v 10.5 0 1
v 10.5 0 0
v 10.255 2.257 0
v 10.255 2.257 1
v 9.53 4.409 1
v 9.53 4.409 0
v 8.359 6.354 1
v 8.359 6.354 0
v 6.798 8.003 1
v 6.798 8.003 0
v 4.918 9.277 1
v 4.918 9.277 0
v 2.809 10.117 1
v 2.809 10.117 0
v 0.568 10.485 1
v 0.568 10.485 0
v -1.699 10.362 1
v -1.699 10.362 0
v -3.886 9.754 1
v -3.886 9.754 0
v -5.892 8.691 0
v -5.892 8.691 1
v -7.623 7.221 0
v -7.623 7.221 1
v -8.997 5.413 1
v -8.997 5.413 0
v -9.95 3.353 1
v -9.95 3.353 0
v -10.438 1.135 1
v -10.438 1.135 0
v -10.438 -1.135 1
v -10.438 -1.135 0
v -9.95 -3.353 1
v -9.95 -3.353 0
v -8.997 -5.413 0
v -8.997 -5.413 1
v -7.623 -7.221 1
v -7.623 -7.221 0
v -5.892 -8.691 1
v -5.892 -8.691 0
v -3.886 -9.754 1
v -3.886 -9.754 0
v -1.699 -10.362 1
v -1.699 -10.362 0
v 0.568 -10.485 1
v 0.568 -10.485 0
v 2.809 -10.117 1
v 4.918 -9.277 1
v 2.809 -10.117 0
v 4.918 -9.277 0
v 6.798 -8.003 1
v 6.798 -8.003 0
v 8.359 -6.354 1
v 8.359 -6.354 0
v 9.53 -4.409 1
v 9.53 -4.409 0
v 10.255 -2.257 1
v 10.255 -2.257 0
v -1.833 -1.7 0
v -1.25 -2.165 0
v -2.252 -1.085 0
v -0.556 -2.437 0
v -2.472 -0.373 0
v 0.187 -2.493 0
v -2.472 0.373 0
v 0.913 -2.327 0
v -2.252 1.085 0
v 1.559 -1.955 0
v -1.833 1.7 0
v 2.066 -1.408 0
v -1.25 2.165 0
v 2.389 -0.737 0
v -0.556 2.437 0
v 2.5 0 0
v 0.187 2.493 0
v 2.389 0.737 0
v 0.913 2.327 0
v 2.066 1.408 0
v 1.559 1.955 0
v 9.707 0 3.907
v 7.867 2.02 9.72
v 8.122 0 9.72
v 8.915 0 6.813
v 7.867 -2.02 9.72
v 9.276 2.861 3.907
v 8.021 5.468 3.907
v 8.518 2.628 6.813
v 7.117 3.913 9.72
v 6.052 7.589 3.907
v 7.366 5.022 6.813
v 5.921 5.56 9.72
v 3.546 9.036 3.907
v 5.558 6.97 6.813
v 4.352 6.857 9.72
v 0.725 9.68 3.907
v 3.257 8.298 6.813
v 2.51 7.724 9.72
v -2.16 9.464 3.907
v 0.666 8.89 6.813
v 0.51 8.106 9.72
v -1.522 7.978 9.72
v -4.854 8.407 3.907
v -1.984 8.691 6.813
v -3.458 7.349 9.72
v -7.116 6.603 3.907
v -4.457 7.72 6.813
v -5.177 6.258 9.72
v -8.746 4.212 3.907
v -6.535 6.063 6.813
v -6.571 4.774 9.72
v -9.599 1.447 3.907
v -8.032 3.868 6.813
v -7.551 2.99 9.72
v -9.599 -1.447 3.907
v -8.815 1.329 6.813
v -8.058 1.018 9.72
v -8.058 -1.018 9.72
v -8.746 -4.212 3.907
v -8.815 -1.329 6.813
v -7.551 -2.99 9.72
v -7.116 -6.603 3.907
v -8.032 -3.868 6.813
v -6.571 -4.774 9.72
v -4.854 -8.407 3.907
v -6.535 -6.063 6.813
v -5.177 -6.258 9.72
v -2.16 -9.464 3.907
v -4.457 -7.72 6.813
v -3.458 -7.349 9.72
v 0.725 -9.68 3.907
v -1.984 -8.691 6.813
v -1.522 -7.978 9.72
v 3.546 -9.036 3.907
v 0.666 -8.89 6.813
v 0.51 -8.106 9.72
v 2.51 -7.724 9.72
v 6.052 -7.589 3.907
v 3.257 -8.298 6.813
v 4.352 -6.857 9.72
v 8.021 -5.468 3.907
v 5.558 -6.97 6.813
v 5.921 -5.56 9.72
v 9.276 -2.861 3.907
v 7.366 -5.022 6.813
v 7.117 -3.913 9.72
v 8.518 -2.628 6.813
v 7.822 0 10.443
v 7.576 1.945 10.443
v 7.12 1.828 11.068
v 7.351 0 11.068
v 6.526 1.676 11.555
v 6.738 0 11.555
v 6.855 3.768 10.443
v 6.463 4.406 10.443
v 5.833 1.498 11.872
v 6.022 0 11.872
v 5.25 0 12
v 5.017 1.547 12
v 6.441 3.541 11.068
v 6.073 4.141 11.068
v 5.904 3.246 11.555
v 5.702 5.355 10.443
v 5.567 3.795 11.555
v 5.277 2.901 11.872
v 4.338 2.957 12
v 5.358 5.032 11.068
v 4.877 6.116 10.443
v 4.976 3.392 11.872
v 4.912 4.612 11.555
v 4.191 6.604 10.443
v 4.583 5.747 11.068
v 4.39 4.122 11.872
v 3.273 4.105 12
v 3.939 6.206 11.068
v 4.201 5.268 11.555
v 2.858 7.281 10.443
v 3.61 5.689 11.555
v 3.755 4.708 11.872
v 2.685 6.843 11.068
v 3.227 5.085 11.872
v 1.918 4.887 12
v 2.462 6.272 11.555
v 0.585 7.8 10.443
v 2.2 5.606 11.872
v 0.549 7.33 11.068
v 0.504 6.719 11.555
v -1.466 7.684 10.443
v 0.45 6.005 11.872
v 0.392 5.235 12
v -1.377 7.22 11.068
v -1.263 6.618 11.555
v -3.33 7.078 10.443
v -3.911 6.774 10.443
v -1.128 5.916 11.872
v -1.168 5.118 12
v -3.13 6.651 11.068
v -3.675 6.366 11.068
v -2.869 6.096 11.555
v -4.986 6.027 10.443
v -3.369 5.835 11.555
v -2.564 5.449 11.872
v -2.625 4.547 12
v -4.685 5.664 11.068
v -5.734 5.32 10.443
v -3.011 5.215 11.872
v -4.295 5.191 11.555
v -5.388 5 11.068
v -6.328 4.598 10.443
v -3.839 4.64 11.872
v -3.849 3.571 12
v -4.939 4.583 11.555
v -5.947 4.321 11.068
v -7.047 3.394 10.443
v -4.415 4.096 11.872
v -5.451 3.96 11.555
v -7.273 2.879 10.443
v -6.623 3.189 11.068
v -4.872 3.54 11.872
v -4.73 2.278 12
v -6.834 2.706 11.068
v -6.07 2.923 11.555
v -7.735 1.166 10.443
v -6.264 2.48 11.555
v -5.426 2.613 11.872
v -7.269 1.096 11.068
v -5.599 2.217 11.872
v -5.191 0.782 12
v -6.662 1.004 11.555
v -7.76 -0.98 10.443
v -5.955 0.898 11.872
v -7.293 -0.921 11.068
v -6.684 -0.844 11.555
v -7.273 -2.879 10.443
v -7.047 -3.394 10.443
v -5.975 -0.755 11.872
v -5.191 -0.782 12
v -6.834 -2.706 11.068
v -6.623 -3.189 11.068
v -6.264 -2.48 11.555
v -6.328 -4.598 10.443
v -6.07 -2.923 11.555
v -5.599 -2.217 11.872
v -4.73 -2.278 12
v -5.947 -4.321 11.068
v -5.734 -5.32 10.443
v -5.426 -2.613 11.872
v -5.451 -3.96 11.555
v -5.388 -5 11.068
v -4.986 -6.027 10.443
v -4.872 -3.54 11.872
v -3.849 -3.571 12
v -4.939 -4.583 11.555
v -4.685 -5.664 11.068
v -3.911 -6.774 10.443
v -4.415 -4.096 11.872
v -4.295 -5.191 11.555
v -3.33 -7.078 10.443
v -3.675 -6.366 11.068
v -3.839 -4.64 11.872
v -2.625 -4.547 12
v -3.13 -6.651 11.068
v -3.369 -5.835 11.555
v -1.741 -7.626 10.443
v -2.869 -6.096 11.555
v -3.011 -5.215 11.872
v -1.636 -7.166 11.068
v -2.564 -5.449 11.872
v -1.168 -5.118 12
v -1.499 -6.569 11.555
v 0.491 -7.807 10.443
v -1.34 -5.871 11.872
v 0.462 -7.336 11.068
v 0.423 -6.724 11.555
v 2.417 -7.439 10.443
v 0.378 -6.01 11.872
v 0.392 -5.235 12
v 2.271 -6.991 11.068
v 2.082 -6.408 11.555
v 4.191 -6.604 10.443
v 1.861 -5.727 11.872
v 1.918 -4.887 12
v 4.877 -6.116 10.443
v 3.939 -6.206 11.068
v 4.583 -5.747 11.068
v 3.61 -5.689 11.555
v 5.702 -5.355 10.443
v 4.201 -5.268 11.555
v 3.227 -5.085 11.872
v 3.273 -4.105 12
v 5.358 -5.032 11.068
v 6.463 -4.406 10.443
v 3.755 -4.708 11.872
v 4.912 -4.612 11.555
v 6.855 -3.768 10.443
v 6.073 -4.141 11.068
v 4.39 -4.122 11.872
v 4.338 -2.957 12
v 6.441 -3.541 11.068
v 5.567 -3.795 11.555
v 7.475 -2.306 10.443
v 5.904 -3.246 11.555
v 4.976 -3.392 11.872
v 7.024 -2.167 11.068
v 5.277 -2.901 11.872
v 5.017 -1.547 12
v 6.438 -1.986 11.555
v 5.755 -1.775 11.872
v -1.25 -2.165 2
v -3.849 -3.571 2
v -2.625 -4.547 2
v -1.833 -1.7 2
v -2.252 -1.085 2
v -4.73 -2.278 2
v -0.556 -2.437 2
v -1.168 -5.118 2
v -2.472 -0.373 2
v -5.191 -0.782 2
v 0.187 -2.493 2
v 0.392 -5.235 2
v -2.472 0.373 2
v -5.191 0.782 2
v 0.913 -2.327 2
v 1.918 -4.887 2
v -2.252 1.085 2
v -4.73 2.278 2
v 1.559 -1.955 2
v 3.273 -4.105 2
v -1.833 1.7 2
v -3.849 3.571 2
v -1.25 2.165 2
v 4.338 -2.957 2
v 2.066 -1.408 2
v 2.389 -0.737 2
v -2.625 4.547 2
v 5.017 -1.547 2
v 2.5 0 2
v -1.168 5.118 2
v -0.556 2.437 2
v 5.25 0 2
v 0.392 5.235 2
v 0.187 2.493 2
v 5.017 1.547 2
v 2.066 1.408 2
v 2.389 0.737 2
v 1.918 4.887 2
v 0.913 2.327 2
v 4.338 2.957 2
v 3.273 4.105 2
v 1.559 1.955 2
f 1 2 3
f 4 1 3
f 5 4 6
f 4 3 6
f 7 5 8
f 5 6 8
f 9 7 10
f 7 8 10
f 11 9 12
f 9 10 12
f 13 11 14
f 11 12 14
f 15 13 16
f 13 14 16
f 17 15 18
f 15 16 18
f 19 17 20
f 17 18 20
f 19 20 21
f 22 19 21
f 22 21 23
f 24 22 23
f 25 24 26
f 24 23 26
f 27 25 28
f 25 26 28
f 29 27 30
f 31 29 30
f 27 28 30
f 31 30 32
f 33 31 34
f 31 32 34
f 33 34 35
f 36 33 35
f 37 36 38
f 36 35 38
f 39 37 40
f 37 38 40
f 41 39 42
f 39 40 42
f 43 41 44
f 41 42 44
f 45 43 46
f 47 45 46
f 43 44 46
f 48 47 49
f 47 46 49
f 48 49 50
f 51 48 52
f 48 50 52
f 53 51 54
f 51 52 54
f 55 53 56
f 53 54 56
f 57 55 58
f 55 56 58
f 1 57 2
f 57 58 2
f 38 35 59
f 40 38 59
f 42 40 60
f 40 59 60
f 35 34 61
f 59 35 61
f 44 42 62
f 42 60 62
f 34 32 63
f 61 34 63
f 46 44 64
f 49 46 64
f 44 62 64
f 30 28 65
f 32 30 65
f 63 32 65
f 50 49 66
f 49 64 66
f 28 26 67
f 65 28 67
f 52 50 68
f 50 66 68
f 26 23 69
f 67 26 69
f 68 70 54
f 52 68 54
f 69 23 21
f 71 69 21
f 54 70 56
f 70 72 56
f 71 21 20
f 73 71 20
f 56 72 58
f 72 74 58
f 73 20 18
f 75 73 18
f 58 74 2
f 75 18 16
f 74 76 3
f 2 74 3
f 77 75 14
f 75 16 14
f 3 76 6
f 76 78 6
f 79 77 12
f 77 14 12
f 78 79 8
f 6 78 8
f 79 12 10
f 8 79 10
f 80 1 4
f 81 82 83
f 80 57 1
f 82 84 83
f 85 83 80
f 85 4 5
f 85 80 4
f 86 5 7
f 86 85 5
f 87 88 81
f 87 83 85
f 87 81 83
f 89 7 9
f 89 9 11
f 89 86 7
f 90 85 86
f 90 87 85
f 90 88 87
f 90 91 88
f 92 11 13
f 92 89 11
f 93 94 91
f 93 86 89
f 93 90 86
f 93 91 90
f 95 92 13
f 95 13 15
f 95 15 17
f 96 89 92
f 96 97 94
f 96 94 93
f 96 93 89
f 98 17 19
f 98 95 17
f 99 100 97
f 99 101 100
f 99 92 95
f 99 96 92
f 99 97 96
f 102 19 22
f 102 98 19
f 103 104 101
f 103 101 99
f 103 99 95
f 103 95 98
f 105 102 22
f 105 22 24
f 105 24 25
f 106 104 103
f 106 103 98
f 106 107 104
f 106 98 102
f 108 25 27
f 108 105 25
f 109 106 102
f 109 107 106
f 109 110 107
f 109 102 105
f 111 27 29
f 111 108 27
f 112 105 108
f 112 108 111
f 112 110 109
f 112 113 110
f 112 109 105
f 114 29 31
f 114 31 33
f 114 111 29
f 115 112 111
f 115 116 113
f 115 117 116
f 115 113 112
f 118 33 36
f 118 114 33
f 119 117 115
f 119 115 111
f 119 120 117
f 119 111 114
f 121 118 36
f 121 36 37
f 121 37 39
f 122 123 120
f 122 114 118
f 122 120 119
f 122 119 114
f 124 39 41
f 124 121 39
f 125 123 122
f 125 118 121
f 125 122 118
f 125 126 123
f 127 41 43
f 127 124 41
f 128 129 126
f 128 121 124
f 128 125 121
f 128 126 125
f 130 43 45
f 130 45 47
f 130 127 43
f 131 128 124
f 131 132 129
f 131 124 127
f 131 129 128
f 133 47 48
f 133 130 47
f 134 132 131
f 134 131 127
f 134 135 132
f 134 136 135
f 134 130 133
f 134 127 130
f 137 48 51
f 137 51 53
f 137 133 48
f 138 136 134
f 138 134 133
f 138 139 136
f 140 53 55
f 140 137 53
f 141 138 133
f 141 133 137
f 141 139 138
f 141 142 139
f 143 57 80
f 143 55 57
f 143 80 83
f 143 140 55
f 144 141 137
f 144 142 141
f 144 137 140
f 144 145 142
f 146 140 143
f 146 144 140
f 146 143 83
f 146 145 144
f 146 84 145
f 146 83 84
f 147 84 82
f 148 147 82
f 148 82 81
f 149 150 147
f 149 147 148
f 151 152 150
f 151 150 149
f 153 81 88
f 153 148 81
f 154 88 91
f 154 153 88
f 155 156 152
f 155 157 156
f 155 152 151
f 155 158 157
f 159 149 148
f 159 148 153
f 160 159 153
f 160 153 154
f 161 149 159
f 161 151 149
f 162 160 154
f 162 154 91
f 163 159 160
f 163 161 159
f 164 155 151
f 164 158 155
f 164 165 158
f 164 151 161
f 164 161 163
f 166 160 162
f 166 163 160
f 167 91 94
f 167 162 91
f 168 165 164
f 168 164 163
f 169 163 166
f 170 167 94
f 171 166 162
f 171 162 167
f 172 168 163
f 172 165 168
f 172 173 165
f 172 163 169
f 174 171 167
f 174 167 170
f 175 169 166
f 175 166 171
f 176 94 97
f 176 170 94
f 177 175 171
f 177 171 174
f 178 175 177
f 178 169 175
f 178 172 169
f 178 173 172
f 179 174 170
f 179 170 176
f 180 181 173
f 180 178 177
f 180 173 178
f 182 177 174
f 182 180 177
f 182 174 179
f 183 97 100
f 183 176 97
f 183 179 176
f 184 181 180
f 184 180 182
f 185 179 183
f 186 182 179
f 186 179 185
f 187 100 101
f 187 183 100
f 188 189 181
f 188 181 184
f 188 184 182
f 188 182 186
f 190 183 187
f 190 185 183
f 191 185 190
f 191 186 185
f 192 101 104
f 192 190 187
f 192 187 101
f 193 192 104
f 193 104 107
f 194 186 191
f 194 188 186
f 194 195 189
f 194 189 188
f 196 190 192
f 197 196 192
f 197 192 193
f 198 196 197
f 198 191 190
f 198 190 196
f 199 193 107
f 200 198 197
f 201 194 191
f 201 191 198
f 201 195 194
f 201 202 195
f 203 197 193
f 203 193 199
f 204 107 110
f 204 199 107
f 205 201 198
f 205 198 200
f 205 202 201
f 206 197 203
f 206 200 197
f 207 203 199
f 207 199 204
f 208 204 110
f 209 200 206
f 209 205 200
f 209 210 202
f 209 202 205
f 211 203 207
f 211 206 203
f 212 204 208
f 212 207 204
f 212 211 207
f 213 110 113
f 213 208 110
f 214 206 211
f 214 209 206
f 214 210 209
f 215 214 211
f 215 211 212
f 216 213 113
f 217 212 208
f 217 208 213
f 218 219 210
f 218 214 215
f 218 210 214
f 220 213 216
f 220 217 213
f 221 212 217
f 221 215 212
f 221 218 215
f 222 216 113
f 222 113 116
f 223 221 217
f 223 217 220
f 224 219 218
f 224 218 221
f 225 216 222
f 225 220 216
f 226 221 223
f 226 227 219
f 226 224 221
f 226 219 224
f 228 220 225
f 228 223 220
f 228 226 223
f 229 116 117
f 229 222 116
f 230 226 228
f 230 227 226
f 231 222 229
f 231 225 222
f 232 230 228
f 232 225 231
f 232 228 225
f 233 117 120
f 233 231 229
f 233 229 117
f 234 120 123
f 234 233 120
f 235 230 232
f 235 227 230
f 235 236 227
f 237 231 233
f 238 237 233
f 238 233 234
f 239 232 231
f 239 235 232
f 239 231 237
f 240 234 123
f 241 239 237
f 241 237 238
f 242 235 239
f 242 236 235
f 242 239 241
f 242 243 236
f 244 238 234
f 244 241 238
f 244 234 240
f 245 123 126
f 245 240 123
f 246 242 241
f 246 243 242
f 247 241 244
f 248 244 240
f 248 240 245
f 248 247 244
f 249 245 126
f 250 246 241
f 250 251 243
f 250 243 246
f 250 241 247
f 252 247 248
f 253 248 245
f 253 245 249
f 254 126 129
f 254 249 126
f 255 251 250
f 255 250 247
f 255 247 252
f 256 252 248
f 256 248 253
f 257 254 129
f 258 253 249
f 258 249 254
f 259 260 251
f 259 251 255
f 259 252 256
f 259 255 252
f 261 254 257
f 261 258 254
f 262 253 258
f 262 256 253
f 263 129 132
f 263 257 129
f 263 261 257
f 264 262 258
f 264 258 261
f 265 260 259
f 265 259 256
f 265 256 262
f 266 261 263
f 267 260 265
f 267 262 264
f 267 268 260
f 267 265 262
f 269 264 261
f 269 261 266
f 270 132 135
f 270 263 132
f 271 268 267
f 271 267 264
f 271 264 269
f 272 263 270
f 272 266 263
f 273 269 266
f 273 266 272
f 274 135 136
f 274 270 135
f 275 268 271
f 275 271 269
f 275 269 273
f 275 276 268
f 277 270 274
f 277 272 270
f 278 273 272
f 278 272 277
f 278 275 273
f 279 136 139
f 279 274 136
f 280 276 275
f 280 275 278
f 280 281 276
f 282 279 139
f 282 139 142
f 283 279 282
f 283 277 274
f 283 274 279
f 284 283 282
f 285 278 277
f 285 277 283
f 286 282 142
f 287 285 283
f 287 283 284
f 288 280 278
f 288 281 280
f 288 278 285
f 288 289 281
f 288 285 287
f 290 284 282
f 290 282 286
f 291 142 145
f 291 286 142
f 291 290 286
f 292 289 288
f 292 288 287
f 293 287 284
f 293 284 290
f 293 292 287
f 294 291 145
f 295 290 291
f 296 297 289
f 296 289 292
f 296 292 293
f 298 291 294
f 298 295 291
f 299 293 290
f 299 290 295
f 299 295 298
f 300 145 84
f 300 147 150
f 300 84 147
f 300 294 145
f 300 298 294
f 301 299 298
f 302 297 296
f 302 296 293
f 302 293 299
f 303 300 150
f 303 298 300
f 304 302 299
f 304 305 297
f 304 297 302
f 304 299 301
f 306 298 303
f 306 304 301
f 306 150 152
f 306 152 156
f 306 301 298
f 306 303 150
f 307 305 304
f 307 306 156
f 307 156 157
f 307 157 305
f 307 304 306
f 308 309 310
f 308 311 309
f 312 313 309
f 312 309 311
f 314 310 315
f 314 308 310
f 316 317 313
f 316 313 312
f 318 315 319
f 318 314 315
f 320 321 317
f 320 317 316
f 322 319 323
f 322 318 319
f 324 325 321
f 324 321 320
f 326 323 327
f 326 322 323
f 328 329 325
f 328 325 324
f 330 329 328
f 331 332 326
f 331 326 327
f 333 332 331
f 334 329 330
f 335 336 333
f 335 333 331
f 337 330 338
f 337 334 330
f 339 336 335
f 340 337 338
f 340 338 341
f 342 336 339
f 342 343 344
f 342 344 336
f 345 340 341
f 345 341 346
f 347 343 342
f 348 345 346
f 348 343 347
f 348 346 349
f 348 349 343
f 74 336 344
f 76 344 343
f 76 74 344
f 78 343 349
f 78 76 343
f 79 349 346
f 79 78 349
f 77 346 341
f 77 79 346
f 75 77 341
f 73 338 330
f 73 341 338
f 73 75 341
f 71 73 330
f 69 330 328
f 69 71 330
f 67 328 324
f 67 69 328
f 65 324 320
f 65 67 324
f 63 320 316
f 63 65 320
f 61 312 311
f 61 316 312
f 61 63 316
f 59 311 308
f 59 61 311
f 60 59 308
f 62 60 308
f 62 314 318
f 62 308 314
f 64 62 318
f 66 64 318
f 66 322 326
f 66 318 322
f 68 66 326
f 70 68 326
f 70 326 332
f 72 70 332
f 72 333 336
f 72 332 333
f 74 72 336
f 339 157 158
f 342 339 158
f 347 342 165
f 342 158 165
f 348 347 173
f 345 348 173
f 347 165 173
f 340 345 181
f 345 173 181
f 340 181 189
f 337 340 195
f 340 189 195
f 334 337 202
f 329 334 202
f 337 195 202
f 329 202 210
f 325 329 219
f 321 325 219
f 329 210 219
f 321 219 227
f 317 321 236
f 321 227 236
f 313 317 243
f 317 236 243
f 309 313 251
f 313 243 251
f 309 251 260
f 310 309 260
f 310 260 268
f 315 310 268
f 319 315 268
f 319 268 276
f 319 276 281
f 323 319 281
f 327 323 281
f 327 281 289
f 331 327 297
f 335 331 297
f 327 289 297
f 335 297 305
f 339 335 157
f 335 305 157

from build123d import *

# Parameters (mm, degrees)
F0_R      = 10.5
F1_DEPTH  = 1
F1_FACE_R = 10.5
F3_R      = 7.5
F5_R      = 2.5
F6_DEPTH  = 12
F7_R      = 5.25
F8_DEPTH  = 10


# Not quite as in the source:
# - a fillet or chamfer that OpenCascade refuses, or shapes differently, is made with other operations: its cross-section is extruded or revolved along the edge and cut away or added


with BuildPart() as f1:
    # F0 (on Top) → F1 (new body)
    with BuildSketch(Plane.XY):
        Circle(F0_R)
    extrude(amount=F1_DEPTH)

    # F1_face (on face) → F4 section 0
    with BuildSketch(Plane.XY.offset(1)):
        Circle(F1_FACE_R)
    # F3 (on offset) → F4 section 1
    with BuildSketch(Plane.XY.offset(12)):
        Circle(F3_R)
    loft()

    # F5 (on Top) → F6 (cut, through all)
    with BuildSketch(Plane.XY):
        Circle(F5_R)
    extrude(amount=F6_DEPTH, mode=Mode.SUBTRACT)

    # F7 (on offset) → F8 (cut)
    with BuildSketch(Plane.XY.offset(12)):
        Circle(F7_R)
    extrude(amount=-F8_DEPTH, mode=Mode.SUBTRACT)

    # F9: fillet of radius 3.0968632265 on 1 edges, made by hand

    # F9_s1 → F9_t2 (revolve, cut)
    with BuildSketch(Plane.XZ):
        with BuildLine():
            ThreePointArc((8.1217780062, 9.7201473108), (7.0595697228, 11.3307742745), (5.25, 12))
            Line((5.25, 12), (7.5, 12))
            Line((7.5, 12), (8.1217780062, 9.7201473108))
        make_face()
    revolve(axis=Axis((0, 0, 12), (0, 0, 1)), mode=Mode.SUBTRACT)


solid = f1.part
